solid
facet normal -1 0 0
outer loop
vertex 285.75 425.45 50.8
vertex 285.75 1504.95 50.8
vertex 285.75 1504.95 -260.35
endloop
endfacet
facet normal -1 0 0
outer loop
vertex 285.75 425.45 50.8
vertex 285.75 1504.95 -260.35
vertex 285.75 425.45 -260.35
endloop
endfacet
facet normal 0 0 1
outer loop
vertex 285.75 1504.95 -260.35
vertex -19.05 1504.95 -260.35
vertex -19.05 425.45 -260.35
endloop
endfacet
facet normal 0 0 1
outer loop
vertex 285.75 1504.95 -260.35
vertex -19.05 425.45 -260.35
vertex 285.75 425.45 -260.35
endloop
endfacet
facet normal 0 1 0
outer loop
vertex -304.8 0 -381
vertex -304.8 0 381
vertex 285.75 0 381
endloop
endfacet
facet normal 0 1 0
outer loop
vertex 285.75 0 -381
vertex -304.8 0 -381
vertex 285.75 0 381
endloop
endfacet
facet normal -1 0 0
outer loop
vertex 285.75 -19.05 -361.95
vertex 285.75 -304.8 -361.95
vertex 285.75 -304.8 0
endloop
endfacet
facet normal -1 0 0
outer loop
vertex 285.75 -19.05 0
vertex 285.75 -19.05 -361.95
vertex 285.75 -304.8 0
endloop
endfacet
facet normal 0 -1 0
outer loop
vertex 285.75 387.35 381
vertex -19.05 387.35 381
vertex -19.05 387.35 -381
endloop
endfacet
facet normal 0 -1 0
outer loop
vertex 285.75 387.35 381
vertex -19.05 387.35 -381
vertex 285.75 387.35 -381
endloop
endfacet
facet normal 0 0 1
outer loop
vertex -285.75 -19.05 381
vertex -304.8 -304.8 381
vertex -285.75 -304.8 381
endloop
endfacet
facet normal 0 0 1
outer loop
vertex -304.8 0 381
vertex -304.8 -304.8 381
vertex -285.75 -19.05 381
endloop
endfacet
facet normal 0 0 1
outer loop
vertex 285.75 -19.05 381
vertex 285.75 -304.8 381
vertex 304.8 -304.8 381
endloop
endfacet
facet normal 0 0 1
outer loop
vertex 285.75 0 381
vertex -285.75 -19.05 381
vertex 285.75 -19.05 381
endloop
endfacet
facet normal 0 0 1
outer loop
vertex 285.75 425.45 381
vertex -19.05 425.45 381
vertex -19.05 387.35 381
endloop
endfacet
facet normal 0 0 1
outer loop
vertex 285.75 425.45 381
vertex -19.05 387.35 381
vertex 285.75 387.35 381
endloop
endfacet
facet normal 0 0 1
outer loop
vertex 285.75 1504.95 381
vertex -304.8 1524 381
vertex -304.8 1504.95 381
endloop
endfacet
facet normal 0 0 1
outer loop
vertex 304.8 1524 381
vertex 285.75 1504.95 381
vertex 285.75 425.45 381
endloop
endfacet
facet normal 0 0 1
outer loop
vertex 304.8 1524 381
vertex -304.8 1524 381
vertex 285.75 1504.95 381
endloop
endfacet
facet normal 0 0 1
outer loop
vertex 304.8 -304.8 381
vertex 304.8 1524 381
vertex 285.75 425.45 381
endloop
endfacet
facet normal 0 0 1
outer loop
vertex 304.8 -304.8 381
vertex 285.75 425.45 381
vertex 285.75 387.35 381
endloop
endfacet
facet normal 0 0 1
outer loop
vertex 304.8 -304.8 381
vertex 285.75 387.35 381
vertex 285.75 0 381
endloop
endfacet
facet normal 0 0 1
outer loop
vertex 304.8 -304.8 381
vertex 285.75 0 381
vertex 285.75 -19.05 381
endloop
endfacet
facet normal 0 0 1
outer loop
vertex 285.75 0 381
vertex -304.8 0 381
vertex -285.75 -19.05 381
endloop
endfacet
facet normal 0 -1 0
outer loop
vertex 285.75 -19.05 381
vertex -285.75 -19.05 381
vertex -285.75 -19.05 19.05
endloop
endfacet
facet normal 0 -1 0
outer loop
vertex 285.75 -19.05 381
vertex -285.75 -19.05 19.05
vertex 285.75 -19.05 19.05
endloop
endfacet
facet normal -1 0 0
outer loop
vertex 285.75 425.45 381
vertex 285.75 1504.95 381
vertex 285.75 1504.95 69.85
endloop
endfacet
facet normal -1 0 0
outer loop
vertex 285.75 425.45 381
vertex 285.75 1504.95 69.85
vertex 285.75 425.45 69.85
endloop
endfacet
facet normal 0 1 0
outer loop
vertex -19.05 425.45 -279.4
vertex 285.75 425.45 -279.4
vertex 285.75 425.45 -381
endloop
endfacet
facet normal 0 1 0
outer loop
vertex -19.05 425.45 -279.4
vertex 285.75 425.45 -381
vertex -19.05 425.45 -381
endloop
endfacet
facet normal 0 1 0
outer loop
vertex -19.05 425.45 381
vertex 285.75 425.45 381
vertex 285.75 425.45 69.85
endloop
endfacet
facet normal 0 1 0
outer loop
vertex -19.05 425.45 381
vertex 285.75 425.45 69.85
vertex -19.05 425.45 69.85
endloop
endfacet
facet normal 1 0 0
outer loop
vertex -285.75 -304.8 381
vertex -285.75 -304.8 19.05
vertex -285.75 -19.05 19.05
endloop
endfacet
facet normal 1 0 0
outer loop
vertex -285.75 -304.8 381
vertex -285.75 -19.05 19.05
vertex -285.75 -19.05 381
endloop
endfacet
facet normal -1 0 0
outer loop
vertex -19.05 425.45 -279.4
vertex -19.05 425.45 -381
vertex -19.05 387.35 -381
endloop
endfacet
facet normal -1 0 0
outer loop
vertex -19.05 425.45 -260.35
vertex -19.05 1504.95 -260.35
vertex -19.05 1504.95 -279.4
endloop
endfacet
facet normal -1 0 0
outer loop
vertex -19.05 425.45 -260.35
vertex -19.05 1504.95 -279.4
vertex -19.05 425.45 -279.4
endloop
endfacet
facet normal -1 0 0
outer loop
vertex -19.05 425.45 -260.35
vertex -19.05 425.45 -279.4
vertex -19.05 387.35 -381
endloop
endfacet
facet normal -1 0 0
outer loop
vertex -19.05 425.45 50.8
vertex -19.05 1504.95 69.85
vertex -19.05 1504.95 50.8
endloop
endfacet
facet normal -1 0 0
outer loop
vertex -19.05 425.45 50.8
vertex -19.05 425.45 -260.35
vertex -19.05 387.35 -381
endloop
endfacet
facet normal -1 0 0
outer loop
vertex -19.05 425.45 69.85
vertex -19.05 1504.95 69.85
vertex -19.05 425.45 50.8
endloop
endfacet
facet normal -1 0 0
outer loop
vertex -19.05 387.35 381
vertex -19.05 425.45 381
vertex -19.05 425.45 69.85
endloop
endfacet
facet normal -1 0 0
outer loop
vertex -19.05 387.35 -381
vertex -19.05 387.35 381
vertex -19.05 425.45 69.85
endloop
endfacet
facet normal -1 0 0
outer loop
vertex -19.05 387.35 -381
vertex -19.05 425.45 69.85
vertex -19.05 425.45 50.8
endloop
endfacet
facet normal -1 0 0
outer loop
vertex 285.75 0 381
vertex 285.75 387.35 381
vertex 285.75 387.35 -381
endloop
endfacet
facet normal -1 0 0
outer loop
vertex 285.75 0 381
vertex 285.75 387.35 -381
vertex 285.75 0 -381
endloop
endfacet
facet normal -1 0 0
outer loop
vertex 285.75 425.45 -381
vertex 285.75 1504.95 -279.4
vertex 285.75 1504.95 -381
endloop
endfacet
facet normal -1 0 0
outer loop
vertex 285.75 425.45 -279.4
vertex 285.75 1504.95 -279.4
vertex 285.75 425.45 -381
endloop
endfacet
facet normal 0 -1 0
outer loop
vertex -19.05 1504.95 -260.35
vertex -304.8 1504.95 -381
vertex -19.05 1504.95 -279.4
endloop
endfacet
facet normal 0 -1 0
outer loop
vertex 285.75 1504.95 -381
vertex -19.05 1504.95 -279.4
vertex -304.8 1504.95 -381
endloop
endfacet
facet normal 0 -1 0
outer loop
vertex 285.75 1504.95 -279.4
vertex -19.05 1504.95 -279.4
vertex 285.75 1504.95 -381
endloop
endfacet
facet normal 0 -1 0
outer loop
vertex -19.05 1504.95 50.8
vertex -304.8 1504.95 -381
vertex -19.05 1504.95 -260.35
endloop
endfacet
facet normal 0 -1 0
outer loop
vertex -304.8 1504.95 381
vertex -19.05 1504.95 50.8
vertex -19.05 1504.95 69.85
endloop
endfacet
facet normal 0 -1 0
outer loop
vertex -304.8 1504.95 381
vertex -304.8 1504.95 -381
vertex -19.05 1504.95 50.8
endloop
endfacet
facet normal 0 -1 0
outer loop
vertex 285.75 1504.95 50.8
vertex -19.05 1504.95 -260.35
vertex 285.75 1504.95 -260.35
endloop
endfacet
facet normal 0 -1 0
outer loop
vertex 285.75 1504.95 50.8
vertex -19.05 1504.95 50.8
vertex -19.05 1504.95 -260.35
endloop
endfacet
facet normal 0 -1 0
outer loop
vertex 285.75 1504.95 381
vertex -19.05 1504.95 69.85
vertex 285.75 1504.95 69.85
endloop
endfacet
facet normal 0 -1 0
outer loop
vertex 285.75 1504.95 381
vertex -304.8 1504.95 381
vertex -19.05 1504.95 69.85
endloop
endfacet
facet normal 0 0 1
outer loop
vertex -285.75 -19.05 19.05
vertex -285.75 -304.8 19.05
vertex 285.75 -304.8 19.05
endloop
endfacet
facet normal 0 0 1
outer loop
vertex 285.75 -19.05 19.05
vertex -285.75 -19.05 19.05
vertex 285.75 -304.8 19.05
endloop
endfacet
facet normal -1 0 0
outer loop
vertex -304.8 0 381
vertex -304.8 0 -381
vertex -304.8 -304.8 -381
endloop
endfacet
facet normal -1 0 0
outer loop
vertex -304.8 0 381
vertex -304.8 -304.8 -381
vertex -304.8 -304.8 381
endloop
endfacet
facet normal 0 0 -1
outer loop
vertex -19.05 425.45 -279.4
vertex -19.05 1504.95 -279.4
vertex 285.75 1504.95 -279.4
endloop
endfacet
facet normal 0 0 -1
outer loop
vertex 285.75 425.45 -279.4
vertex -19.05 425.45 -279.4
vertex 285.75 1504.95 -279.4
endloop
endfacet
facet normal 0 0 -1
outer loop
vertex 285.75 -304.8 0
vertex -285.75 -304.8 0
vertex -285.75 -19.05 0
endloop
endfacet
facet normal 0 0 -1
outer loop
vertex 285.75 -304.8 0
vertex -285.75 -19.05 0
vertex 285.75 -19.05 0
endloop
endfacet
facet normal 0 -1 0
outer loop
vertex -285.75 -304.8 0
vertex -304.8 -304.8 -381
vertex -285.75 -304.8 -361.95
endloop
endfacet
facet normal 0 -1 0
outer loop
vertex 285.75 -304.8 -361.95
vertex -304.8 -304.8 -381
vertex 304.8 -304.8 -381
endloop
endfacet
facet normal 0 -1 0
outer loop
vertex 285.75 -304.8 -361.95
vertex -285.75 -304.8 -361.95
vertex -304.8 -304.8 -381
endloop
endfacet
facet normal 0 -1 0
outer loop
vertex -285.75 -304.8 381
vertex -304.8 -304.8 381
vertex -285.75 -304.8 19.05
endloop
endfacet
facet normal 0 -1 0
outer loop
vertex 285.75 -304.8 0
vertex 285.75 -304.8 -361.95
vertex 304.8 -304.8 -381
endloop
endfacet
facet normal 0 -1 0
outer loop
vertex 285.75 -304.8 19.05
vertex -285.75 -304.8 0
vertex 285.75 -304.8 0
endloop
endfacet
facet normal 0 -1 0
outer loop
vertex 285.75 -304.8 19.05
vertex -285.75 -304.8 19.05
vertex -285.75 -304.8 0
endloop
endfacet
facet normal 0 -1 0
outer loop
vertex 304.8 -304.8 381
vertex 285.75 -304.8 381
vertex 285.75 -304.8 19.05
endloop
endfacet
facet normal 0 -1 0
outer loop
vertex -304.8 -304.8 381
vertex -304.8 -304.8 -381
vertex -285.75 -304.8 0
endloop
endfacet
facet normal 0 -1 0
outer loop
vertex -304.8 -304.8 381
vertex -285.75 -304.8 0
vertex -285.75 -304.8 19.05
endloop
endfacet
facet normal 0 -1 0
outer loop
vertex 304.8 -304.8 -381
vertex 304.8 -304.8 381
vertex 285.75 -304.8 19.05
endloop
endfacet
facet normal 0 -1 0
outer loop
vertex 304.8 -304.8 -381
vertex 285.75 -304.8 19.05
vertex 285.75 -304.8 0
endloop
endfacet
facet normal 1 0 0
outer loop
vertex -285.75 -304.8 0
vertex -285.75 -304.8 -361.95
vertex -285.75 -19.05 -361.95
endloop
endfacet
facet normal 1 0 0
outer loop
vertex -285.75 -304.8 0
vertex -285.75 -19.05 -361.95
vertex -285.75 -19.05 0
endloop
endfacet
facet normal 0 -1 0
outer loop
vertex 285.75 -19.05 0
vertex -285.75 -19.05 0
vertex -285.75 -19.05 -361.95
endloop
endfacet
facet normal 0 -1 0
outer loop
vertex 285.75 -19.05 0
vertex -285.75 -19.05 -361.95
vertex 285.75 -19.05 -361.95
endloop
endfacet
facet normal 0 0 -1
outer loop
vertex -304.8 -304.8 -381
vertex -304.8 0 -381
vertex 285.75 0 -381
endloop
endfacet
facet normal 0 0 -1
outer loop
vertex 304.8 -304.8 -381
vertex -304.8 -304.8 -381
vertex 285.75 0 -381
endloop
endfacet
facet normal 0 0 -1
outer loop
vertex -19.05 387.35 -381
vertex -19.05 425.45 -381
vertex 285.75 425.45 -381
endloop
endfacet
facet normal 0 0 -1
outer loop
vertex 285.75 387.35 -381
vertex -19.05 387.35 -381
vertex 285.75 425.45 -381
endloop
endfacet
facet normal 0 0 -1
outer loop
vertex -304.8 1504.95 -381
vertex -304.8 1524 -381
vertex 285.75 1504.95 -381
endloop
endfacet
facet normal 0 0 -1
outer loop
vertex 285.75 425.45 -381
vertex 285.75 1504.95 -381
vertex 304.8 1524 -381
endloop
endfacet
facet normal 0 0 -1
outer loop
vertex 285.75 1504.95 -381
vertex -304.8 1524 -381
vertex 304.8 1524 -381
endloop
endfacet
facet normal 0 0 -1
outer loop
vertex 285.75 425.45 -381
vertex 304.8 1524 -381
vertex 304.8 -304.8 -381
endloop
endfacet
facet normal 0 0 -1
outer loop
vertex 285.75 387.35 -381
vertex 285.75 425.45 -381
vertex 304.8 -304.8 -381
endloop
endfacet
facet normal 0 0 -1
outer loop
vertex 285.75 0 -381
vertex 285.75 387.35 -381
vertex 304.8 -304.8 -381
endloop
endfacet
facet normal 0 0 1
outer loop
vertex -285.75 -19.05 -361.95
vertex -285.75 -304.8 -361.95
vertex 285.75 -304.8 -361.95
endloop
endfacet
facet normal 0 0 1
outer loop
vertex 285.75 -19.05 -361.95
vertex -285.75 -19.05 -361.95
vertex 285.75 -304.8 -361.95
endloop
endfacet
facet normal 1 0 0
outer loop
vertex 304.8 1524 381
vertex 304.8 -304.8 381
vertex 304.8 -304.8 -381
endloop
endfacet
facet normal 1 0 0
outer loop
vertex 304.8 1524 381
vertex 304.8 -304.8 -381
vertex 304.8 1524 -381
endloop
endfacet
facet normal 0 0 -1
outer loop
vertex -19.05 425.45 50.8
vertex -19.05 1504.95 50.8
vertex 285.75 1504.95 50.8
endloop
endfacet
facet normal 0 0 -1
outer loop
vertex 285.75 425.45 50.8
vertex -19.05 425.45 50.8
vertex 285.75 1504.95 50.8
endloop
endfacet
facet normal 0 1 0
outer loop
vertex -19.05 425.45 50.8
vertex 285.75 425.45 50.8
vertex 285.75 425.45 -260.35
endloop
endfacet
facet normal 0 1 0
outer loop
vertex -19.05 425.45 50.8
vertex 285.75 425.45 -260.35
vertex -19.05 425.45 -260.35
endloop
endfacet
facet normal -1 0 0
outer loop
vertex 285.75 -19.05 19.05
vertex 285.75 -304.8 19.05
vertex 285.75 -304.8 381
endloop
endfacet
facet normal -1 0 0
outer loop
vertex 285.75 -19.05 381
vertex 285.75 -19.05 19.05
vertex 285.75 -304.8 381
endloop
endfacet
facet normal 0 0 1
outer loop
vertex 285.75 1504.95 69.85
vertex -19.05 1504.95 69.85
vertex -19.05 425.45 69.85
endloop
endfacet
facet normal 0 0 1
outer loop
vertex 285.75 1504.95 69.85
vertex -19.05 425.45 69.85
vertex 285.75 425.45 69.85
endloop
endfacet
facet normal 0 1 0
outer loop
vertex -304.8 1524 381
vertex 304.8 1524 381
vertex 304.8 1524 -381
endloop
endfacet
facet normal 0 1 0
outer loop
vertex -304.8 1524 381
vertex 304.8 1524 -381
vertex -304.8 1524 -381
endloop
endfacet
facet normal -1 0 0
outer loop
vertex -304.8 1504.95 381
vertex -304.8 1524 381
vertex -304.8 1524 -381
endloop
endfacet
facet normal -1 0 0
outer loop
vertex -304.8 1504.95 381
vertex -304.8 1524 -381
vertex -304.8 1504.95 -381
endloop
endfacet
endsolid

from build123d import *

# Parameters (mm, degrees)
F0_W     = 609.6
F0_H     = 762
F1_DEPTH = 304.8
F2_W     = 571.5
F2_H     = 361.95
F3_DEPTH = 285.75
F5_DEPTH = 762
F6_W     = 304.8
F6_H     = 19.05
F7_DEPTH = 1079.5


with BuildPart() as f1:
    # F0 (on Front) → F1 (new body)
    with BuildSketch(Plane.XZ):
        Rectangle(F0_W, F0_H)
    extrude(amount=F1_DEPTH)

    # F2 (on face) → F3 (cut, through all)
    with BuildSketch(Plane.XZ.offset(304.8)):
        with Locations((0, 200.025)):
            Rectangle(F2_W, F2_H)
        with Locations((0, -180.975)):
            Rectangle(F2_W, F2_H)
    extrude(amount=-F3_DEPTH, mode=Mode.SUBTRACT)

    # F4 (on face) → F5 (join, through all)
    with BuildSketch(Plane.XY.offset(381)):
        Polygon((285.75, 0), (304.8, 0), (304.8, 1524), (-304.8, 1524), (-304.8, 1504.95), (285.75, 1504.95), (285.75, 425.45), (-19.05, 425.45), (-19.05, 387.35), (285.75, 387.35), align=None)
    extrude(amount=-F5_DEPTH)

    # F6 (on face) → F7 (join, through all)
    with BuildSketch(Plane.XZ.offset(-1504.95)):
        with Locations((133.35, -269.875)):
            Rectangle(F6_W, F6_H)
        with Locations((133.35, 60.325)):
            Rectangle(F6_W, F6_H)
    extrude(amount=F7_DEPTH)


solid = f1.part
